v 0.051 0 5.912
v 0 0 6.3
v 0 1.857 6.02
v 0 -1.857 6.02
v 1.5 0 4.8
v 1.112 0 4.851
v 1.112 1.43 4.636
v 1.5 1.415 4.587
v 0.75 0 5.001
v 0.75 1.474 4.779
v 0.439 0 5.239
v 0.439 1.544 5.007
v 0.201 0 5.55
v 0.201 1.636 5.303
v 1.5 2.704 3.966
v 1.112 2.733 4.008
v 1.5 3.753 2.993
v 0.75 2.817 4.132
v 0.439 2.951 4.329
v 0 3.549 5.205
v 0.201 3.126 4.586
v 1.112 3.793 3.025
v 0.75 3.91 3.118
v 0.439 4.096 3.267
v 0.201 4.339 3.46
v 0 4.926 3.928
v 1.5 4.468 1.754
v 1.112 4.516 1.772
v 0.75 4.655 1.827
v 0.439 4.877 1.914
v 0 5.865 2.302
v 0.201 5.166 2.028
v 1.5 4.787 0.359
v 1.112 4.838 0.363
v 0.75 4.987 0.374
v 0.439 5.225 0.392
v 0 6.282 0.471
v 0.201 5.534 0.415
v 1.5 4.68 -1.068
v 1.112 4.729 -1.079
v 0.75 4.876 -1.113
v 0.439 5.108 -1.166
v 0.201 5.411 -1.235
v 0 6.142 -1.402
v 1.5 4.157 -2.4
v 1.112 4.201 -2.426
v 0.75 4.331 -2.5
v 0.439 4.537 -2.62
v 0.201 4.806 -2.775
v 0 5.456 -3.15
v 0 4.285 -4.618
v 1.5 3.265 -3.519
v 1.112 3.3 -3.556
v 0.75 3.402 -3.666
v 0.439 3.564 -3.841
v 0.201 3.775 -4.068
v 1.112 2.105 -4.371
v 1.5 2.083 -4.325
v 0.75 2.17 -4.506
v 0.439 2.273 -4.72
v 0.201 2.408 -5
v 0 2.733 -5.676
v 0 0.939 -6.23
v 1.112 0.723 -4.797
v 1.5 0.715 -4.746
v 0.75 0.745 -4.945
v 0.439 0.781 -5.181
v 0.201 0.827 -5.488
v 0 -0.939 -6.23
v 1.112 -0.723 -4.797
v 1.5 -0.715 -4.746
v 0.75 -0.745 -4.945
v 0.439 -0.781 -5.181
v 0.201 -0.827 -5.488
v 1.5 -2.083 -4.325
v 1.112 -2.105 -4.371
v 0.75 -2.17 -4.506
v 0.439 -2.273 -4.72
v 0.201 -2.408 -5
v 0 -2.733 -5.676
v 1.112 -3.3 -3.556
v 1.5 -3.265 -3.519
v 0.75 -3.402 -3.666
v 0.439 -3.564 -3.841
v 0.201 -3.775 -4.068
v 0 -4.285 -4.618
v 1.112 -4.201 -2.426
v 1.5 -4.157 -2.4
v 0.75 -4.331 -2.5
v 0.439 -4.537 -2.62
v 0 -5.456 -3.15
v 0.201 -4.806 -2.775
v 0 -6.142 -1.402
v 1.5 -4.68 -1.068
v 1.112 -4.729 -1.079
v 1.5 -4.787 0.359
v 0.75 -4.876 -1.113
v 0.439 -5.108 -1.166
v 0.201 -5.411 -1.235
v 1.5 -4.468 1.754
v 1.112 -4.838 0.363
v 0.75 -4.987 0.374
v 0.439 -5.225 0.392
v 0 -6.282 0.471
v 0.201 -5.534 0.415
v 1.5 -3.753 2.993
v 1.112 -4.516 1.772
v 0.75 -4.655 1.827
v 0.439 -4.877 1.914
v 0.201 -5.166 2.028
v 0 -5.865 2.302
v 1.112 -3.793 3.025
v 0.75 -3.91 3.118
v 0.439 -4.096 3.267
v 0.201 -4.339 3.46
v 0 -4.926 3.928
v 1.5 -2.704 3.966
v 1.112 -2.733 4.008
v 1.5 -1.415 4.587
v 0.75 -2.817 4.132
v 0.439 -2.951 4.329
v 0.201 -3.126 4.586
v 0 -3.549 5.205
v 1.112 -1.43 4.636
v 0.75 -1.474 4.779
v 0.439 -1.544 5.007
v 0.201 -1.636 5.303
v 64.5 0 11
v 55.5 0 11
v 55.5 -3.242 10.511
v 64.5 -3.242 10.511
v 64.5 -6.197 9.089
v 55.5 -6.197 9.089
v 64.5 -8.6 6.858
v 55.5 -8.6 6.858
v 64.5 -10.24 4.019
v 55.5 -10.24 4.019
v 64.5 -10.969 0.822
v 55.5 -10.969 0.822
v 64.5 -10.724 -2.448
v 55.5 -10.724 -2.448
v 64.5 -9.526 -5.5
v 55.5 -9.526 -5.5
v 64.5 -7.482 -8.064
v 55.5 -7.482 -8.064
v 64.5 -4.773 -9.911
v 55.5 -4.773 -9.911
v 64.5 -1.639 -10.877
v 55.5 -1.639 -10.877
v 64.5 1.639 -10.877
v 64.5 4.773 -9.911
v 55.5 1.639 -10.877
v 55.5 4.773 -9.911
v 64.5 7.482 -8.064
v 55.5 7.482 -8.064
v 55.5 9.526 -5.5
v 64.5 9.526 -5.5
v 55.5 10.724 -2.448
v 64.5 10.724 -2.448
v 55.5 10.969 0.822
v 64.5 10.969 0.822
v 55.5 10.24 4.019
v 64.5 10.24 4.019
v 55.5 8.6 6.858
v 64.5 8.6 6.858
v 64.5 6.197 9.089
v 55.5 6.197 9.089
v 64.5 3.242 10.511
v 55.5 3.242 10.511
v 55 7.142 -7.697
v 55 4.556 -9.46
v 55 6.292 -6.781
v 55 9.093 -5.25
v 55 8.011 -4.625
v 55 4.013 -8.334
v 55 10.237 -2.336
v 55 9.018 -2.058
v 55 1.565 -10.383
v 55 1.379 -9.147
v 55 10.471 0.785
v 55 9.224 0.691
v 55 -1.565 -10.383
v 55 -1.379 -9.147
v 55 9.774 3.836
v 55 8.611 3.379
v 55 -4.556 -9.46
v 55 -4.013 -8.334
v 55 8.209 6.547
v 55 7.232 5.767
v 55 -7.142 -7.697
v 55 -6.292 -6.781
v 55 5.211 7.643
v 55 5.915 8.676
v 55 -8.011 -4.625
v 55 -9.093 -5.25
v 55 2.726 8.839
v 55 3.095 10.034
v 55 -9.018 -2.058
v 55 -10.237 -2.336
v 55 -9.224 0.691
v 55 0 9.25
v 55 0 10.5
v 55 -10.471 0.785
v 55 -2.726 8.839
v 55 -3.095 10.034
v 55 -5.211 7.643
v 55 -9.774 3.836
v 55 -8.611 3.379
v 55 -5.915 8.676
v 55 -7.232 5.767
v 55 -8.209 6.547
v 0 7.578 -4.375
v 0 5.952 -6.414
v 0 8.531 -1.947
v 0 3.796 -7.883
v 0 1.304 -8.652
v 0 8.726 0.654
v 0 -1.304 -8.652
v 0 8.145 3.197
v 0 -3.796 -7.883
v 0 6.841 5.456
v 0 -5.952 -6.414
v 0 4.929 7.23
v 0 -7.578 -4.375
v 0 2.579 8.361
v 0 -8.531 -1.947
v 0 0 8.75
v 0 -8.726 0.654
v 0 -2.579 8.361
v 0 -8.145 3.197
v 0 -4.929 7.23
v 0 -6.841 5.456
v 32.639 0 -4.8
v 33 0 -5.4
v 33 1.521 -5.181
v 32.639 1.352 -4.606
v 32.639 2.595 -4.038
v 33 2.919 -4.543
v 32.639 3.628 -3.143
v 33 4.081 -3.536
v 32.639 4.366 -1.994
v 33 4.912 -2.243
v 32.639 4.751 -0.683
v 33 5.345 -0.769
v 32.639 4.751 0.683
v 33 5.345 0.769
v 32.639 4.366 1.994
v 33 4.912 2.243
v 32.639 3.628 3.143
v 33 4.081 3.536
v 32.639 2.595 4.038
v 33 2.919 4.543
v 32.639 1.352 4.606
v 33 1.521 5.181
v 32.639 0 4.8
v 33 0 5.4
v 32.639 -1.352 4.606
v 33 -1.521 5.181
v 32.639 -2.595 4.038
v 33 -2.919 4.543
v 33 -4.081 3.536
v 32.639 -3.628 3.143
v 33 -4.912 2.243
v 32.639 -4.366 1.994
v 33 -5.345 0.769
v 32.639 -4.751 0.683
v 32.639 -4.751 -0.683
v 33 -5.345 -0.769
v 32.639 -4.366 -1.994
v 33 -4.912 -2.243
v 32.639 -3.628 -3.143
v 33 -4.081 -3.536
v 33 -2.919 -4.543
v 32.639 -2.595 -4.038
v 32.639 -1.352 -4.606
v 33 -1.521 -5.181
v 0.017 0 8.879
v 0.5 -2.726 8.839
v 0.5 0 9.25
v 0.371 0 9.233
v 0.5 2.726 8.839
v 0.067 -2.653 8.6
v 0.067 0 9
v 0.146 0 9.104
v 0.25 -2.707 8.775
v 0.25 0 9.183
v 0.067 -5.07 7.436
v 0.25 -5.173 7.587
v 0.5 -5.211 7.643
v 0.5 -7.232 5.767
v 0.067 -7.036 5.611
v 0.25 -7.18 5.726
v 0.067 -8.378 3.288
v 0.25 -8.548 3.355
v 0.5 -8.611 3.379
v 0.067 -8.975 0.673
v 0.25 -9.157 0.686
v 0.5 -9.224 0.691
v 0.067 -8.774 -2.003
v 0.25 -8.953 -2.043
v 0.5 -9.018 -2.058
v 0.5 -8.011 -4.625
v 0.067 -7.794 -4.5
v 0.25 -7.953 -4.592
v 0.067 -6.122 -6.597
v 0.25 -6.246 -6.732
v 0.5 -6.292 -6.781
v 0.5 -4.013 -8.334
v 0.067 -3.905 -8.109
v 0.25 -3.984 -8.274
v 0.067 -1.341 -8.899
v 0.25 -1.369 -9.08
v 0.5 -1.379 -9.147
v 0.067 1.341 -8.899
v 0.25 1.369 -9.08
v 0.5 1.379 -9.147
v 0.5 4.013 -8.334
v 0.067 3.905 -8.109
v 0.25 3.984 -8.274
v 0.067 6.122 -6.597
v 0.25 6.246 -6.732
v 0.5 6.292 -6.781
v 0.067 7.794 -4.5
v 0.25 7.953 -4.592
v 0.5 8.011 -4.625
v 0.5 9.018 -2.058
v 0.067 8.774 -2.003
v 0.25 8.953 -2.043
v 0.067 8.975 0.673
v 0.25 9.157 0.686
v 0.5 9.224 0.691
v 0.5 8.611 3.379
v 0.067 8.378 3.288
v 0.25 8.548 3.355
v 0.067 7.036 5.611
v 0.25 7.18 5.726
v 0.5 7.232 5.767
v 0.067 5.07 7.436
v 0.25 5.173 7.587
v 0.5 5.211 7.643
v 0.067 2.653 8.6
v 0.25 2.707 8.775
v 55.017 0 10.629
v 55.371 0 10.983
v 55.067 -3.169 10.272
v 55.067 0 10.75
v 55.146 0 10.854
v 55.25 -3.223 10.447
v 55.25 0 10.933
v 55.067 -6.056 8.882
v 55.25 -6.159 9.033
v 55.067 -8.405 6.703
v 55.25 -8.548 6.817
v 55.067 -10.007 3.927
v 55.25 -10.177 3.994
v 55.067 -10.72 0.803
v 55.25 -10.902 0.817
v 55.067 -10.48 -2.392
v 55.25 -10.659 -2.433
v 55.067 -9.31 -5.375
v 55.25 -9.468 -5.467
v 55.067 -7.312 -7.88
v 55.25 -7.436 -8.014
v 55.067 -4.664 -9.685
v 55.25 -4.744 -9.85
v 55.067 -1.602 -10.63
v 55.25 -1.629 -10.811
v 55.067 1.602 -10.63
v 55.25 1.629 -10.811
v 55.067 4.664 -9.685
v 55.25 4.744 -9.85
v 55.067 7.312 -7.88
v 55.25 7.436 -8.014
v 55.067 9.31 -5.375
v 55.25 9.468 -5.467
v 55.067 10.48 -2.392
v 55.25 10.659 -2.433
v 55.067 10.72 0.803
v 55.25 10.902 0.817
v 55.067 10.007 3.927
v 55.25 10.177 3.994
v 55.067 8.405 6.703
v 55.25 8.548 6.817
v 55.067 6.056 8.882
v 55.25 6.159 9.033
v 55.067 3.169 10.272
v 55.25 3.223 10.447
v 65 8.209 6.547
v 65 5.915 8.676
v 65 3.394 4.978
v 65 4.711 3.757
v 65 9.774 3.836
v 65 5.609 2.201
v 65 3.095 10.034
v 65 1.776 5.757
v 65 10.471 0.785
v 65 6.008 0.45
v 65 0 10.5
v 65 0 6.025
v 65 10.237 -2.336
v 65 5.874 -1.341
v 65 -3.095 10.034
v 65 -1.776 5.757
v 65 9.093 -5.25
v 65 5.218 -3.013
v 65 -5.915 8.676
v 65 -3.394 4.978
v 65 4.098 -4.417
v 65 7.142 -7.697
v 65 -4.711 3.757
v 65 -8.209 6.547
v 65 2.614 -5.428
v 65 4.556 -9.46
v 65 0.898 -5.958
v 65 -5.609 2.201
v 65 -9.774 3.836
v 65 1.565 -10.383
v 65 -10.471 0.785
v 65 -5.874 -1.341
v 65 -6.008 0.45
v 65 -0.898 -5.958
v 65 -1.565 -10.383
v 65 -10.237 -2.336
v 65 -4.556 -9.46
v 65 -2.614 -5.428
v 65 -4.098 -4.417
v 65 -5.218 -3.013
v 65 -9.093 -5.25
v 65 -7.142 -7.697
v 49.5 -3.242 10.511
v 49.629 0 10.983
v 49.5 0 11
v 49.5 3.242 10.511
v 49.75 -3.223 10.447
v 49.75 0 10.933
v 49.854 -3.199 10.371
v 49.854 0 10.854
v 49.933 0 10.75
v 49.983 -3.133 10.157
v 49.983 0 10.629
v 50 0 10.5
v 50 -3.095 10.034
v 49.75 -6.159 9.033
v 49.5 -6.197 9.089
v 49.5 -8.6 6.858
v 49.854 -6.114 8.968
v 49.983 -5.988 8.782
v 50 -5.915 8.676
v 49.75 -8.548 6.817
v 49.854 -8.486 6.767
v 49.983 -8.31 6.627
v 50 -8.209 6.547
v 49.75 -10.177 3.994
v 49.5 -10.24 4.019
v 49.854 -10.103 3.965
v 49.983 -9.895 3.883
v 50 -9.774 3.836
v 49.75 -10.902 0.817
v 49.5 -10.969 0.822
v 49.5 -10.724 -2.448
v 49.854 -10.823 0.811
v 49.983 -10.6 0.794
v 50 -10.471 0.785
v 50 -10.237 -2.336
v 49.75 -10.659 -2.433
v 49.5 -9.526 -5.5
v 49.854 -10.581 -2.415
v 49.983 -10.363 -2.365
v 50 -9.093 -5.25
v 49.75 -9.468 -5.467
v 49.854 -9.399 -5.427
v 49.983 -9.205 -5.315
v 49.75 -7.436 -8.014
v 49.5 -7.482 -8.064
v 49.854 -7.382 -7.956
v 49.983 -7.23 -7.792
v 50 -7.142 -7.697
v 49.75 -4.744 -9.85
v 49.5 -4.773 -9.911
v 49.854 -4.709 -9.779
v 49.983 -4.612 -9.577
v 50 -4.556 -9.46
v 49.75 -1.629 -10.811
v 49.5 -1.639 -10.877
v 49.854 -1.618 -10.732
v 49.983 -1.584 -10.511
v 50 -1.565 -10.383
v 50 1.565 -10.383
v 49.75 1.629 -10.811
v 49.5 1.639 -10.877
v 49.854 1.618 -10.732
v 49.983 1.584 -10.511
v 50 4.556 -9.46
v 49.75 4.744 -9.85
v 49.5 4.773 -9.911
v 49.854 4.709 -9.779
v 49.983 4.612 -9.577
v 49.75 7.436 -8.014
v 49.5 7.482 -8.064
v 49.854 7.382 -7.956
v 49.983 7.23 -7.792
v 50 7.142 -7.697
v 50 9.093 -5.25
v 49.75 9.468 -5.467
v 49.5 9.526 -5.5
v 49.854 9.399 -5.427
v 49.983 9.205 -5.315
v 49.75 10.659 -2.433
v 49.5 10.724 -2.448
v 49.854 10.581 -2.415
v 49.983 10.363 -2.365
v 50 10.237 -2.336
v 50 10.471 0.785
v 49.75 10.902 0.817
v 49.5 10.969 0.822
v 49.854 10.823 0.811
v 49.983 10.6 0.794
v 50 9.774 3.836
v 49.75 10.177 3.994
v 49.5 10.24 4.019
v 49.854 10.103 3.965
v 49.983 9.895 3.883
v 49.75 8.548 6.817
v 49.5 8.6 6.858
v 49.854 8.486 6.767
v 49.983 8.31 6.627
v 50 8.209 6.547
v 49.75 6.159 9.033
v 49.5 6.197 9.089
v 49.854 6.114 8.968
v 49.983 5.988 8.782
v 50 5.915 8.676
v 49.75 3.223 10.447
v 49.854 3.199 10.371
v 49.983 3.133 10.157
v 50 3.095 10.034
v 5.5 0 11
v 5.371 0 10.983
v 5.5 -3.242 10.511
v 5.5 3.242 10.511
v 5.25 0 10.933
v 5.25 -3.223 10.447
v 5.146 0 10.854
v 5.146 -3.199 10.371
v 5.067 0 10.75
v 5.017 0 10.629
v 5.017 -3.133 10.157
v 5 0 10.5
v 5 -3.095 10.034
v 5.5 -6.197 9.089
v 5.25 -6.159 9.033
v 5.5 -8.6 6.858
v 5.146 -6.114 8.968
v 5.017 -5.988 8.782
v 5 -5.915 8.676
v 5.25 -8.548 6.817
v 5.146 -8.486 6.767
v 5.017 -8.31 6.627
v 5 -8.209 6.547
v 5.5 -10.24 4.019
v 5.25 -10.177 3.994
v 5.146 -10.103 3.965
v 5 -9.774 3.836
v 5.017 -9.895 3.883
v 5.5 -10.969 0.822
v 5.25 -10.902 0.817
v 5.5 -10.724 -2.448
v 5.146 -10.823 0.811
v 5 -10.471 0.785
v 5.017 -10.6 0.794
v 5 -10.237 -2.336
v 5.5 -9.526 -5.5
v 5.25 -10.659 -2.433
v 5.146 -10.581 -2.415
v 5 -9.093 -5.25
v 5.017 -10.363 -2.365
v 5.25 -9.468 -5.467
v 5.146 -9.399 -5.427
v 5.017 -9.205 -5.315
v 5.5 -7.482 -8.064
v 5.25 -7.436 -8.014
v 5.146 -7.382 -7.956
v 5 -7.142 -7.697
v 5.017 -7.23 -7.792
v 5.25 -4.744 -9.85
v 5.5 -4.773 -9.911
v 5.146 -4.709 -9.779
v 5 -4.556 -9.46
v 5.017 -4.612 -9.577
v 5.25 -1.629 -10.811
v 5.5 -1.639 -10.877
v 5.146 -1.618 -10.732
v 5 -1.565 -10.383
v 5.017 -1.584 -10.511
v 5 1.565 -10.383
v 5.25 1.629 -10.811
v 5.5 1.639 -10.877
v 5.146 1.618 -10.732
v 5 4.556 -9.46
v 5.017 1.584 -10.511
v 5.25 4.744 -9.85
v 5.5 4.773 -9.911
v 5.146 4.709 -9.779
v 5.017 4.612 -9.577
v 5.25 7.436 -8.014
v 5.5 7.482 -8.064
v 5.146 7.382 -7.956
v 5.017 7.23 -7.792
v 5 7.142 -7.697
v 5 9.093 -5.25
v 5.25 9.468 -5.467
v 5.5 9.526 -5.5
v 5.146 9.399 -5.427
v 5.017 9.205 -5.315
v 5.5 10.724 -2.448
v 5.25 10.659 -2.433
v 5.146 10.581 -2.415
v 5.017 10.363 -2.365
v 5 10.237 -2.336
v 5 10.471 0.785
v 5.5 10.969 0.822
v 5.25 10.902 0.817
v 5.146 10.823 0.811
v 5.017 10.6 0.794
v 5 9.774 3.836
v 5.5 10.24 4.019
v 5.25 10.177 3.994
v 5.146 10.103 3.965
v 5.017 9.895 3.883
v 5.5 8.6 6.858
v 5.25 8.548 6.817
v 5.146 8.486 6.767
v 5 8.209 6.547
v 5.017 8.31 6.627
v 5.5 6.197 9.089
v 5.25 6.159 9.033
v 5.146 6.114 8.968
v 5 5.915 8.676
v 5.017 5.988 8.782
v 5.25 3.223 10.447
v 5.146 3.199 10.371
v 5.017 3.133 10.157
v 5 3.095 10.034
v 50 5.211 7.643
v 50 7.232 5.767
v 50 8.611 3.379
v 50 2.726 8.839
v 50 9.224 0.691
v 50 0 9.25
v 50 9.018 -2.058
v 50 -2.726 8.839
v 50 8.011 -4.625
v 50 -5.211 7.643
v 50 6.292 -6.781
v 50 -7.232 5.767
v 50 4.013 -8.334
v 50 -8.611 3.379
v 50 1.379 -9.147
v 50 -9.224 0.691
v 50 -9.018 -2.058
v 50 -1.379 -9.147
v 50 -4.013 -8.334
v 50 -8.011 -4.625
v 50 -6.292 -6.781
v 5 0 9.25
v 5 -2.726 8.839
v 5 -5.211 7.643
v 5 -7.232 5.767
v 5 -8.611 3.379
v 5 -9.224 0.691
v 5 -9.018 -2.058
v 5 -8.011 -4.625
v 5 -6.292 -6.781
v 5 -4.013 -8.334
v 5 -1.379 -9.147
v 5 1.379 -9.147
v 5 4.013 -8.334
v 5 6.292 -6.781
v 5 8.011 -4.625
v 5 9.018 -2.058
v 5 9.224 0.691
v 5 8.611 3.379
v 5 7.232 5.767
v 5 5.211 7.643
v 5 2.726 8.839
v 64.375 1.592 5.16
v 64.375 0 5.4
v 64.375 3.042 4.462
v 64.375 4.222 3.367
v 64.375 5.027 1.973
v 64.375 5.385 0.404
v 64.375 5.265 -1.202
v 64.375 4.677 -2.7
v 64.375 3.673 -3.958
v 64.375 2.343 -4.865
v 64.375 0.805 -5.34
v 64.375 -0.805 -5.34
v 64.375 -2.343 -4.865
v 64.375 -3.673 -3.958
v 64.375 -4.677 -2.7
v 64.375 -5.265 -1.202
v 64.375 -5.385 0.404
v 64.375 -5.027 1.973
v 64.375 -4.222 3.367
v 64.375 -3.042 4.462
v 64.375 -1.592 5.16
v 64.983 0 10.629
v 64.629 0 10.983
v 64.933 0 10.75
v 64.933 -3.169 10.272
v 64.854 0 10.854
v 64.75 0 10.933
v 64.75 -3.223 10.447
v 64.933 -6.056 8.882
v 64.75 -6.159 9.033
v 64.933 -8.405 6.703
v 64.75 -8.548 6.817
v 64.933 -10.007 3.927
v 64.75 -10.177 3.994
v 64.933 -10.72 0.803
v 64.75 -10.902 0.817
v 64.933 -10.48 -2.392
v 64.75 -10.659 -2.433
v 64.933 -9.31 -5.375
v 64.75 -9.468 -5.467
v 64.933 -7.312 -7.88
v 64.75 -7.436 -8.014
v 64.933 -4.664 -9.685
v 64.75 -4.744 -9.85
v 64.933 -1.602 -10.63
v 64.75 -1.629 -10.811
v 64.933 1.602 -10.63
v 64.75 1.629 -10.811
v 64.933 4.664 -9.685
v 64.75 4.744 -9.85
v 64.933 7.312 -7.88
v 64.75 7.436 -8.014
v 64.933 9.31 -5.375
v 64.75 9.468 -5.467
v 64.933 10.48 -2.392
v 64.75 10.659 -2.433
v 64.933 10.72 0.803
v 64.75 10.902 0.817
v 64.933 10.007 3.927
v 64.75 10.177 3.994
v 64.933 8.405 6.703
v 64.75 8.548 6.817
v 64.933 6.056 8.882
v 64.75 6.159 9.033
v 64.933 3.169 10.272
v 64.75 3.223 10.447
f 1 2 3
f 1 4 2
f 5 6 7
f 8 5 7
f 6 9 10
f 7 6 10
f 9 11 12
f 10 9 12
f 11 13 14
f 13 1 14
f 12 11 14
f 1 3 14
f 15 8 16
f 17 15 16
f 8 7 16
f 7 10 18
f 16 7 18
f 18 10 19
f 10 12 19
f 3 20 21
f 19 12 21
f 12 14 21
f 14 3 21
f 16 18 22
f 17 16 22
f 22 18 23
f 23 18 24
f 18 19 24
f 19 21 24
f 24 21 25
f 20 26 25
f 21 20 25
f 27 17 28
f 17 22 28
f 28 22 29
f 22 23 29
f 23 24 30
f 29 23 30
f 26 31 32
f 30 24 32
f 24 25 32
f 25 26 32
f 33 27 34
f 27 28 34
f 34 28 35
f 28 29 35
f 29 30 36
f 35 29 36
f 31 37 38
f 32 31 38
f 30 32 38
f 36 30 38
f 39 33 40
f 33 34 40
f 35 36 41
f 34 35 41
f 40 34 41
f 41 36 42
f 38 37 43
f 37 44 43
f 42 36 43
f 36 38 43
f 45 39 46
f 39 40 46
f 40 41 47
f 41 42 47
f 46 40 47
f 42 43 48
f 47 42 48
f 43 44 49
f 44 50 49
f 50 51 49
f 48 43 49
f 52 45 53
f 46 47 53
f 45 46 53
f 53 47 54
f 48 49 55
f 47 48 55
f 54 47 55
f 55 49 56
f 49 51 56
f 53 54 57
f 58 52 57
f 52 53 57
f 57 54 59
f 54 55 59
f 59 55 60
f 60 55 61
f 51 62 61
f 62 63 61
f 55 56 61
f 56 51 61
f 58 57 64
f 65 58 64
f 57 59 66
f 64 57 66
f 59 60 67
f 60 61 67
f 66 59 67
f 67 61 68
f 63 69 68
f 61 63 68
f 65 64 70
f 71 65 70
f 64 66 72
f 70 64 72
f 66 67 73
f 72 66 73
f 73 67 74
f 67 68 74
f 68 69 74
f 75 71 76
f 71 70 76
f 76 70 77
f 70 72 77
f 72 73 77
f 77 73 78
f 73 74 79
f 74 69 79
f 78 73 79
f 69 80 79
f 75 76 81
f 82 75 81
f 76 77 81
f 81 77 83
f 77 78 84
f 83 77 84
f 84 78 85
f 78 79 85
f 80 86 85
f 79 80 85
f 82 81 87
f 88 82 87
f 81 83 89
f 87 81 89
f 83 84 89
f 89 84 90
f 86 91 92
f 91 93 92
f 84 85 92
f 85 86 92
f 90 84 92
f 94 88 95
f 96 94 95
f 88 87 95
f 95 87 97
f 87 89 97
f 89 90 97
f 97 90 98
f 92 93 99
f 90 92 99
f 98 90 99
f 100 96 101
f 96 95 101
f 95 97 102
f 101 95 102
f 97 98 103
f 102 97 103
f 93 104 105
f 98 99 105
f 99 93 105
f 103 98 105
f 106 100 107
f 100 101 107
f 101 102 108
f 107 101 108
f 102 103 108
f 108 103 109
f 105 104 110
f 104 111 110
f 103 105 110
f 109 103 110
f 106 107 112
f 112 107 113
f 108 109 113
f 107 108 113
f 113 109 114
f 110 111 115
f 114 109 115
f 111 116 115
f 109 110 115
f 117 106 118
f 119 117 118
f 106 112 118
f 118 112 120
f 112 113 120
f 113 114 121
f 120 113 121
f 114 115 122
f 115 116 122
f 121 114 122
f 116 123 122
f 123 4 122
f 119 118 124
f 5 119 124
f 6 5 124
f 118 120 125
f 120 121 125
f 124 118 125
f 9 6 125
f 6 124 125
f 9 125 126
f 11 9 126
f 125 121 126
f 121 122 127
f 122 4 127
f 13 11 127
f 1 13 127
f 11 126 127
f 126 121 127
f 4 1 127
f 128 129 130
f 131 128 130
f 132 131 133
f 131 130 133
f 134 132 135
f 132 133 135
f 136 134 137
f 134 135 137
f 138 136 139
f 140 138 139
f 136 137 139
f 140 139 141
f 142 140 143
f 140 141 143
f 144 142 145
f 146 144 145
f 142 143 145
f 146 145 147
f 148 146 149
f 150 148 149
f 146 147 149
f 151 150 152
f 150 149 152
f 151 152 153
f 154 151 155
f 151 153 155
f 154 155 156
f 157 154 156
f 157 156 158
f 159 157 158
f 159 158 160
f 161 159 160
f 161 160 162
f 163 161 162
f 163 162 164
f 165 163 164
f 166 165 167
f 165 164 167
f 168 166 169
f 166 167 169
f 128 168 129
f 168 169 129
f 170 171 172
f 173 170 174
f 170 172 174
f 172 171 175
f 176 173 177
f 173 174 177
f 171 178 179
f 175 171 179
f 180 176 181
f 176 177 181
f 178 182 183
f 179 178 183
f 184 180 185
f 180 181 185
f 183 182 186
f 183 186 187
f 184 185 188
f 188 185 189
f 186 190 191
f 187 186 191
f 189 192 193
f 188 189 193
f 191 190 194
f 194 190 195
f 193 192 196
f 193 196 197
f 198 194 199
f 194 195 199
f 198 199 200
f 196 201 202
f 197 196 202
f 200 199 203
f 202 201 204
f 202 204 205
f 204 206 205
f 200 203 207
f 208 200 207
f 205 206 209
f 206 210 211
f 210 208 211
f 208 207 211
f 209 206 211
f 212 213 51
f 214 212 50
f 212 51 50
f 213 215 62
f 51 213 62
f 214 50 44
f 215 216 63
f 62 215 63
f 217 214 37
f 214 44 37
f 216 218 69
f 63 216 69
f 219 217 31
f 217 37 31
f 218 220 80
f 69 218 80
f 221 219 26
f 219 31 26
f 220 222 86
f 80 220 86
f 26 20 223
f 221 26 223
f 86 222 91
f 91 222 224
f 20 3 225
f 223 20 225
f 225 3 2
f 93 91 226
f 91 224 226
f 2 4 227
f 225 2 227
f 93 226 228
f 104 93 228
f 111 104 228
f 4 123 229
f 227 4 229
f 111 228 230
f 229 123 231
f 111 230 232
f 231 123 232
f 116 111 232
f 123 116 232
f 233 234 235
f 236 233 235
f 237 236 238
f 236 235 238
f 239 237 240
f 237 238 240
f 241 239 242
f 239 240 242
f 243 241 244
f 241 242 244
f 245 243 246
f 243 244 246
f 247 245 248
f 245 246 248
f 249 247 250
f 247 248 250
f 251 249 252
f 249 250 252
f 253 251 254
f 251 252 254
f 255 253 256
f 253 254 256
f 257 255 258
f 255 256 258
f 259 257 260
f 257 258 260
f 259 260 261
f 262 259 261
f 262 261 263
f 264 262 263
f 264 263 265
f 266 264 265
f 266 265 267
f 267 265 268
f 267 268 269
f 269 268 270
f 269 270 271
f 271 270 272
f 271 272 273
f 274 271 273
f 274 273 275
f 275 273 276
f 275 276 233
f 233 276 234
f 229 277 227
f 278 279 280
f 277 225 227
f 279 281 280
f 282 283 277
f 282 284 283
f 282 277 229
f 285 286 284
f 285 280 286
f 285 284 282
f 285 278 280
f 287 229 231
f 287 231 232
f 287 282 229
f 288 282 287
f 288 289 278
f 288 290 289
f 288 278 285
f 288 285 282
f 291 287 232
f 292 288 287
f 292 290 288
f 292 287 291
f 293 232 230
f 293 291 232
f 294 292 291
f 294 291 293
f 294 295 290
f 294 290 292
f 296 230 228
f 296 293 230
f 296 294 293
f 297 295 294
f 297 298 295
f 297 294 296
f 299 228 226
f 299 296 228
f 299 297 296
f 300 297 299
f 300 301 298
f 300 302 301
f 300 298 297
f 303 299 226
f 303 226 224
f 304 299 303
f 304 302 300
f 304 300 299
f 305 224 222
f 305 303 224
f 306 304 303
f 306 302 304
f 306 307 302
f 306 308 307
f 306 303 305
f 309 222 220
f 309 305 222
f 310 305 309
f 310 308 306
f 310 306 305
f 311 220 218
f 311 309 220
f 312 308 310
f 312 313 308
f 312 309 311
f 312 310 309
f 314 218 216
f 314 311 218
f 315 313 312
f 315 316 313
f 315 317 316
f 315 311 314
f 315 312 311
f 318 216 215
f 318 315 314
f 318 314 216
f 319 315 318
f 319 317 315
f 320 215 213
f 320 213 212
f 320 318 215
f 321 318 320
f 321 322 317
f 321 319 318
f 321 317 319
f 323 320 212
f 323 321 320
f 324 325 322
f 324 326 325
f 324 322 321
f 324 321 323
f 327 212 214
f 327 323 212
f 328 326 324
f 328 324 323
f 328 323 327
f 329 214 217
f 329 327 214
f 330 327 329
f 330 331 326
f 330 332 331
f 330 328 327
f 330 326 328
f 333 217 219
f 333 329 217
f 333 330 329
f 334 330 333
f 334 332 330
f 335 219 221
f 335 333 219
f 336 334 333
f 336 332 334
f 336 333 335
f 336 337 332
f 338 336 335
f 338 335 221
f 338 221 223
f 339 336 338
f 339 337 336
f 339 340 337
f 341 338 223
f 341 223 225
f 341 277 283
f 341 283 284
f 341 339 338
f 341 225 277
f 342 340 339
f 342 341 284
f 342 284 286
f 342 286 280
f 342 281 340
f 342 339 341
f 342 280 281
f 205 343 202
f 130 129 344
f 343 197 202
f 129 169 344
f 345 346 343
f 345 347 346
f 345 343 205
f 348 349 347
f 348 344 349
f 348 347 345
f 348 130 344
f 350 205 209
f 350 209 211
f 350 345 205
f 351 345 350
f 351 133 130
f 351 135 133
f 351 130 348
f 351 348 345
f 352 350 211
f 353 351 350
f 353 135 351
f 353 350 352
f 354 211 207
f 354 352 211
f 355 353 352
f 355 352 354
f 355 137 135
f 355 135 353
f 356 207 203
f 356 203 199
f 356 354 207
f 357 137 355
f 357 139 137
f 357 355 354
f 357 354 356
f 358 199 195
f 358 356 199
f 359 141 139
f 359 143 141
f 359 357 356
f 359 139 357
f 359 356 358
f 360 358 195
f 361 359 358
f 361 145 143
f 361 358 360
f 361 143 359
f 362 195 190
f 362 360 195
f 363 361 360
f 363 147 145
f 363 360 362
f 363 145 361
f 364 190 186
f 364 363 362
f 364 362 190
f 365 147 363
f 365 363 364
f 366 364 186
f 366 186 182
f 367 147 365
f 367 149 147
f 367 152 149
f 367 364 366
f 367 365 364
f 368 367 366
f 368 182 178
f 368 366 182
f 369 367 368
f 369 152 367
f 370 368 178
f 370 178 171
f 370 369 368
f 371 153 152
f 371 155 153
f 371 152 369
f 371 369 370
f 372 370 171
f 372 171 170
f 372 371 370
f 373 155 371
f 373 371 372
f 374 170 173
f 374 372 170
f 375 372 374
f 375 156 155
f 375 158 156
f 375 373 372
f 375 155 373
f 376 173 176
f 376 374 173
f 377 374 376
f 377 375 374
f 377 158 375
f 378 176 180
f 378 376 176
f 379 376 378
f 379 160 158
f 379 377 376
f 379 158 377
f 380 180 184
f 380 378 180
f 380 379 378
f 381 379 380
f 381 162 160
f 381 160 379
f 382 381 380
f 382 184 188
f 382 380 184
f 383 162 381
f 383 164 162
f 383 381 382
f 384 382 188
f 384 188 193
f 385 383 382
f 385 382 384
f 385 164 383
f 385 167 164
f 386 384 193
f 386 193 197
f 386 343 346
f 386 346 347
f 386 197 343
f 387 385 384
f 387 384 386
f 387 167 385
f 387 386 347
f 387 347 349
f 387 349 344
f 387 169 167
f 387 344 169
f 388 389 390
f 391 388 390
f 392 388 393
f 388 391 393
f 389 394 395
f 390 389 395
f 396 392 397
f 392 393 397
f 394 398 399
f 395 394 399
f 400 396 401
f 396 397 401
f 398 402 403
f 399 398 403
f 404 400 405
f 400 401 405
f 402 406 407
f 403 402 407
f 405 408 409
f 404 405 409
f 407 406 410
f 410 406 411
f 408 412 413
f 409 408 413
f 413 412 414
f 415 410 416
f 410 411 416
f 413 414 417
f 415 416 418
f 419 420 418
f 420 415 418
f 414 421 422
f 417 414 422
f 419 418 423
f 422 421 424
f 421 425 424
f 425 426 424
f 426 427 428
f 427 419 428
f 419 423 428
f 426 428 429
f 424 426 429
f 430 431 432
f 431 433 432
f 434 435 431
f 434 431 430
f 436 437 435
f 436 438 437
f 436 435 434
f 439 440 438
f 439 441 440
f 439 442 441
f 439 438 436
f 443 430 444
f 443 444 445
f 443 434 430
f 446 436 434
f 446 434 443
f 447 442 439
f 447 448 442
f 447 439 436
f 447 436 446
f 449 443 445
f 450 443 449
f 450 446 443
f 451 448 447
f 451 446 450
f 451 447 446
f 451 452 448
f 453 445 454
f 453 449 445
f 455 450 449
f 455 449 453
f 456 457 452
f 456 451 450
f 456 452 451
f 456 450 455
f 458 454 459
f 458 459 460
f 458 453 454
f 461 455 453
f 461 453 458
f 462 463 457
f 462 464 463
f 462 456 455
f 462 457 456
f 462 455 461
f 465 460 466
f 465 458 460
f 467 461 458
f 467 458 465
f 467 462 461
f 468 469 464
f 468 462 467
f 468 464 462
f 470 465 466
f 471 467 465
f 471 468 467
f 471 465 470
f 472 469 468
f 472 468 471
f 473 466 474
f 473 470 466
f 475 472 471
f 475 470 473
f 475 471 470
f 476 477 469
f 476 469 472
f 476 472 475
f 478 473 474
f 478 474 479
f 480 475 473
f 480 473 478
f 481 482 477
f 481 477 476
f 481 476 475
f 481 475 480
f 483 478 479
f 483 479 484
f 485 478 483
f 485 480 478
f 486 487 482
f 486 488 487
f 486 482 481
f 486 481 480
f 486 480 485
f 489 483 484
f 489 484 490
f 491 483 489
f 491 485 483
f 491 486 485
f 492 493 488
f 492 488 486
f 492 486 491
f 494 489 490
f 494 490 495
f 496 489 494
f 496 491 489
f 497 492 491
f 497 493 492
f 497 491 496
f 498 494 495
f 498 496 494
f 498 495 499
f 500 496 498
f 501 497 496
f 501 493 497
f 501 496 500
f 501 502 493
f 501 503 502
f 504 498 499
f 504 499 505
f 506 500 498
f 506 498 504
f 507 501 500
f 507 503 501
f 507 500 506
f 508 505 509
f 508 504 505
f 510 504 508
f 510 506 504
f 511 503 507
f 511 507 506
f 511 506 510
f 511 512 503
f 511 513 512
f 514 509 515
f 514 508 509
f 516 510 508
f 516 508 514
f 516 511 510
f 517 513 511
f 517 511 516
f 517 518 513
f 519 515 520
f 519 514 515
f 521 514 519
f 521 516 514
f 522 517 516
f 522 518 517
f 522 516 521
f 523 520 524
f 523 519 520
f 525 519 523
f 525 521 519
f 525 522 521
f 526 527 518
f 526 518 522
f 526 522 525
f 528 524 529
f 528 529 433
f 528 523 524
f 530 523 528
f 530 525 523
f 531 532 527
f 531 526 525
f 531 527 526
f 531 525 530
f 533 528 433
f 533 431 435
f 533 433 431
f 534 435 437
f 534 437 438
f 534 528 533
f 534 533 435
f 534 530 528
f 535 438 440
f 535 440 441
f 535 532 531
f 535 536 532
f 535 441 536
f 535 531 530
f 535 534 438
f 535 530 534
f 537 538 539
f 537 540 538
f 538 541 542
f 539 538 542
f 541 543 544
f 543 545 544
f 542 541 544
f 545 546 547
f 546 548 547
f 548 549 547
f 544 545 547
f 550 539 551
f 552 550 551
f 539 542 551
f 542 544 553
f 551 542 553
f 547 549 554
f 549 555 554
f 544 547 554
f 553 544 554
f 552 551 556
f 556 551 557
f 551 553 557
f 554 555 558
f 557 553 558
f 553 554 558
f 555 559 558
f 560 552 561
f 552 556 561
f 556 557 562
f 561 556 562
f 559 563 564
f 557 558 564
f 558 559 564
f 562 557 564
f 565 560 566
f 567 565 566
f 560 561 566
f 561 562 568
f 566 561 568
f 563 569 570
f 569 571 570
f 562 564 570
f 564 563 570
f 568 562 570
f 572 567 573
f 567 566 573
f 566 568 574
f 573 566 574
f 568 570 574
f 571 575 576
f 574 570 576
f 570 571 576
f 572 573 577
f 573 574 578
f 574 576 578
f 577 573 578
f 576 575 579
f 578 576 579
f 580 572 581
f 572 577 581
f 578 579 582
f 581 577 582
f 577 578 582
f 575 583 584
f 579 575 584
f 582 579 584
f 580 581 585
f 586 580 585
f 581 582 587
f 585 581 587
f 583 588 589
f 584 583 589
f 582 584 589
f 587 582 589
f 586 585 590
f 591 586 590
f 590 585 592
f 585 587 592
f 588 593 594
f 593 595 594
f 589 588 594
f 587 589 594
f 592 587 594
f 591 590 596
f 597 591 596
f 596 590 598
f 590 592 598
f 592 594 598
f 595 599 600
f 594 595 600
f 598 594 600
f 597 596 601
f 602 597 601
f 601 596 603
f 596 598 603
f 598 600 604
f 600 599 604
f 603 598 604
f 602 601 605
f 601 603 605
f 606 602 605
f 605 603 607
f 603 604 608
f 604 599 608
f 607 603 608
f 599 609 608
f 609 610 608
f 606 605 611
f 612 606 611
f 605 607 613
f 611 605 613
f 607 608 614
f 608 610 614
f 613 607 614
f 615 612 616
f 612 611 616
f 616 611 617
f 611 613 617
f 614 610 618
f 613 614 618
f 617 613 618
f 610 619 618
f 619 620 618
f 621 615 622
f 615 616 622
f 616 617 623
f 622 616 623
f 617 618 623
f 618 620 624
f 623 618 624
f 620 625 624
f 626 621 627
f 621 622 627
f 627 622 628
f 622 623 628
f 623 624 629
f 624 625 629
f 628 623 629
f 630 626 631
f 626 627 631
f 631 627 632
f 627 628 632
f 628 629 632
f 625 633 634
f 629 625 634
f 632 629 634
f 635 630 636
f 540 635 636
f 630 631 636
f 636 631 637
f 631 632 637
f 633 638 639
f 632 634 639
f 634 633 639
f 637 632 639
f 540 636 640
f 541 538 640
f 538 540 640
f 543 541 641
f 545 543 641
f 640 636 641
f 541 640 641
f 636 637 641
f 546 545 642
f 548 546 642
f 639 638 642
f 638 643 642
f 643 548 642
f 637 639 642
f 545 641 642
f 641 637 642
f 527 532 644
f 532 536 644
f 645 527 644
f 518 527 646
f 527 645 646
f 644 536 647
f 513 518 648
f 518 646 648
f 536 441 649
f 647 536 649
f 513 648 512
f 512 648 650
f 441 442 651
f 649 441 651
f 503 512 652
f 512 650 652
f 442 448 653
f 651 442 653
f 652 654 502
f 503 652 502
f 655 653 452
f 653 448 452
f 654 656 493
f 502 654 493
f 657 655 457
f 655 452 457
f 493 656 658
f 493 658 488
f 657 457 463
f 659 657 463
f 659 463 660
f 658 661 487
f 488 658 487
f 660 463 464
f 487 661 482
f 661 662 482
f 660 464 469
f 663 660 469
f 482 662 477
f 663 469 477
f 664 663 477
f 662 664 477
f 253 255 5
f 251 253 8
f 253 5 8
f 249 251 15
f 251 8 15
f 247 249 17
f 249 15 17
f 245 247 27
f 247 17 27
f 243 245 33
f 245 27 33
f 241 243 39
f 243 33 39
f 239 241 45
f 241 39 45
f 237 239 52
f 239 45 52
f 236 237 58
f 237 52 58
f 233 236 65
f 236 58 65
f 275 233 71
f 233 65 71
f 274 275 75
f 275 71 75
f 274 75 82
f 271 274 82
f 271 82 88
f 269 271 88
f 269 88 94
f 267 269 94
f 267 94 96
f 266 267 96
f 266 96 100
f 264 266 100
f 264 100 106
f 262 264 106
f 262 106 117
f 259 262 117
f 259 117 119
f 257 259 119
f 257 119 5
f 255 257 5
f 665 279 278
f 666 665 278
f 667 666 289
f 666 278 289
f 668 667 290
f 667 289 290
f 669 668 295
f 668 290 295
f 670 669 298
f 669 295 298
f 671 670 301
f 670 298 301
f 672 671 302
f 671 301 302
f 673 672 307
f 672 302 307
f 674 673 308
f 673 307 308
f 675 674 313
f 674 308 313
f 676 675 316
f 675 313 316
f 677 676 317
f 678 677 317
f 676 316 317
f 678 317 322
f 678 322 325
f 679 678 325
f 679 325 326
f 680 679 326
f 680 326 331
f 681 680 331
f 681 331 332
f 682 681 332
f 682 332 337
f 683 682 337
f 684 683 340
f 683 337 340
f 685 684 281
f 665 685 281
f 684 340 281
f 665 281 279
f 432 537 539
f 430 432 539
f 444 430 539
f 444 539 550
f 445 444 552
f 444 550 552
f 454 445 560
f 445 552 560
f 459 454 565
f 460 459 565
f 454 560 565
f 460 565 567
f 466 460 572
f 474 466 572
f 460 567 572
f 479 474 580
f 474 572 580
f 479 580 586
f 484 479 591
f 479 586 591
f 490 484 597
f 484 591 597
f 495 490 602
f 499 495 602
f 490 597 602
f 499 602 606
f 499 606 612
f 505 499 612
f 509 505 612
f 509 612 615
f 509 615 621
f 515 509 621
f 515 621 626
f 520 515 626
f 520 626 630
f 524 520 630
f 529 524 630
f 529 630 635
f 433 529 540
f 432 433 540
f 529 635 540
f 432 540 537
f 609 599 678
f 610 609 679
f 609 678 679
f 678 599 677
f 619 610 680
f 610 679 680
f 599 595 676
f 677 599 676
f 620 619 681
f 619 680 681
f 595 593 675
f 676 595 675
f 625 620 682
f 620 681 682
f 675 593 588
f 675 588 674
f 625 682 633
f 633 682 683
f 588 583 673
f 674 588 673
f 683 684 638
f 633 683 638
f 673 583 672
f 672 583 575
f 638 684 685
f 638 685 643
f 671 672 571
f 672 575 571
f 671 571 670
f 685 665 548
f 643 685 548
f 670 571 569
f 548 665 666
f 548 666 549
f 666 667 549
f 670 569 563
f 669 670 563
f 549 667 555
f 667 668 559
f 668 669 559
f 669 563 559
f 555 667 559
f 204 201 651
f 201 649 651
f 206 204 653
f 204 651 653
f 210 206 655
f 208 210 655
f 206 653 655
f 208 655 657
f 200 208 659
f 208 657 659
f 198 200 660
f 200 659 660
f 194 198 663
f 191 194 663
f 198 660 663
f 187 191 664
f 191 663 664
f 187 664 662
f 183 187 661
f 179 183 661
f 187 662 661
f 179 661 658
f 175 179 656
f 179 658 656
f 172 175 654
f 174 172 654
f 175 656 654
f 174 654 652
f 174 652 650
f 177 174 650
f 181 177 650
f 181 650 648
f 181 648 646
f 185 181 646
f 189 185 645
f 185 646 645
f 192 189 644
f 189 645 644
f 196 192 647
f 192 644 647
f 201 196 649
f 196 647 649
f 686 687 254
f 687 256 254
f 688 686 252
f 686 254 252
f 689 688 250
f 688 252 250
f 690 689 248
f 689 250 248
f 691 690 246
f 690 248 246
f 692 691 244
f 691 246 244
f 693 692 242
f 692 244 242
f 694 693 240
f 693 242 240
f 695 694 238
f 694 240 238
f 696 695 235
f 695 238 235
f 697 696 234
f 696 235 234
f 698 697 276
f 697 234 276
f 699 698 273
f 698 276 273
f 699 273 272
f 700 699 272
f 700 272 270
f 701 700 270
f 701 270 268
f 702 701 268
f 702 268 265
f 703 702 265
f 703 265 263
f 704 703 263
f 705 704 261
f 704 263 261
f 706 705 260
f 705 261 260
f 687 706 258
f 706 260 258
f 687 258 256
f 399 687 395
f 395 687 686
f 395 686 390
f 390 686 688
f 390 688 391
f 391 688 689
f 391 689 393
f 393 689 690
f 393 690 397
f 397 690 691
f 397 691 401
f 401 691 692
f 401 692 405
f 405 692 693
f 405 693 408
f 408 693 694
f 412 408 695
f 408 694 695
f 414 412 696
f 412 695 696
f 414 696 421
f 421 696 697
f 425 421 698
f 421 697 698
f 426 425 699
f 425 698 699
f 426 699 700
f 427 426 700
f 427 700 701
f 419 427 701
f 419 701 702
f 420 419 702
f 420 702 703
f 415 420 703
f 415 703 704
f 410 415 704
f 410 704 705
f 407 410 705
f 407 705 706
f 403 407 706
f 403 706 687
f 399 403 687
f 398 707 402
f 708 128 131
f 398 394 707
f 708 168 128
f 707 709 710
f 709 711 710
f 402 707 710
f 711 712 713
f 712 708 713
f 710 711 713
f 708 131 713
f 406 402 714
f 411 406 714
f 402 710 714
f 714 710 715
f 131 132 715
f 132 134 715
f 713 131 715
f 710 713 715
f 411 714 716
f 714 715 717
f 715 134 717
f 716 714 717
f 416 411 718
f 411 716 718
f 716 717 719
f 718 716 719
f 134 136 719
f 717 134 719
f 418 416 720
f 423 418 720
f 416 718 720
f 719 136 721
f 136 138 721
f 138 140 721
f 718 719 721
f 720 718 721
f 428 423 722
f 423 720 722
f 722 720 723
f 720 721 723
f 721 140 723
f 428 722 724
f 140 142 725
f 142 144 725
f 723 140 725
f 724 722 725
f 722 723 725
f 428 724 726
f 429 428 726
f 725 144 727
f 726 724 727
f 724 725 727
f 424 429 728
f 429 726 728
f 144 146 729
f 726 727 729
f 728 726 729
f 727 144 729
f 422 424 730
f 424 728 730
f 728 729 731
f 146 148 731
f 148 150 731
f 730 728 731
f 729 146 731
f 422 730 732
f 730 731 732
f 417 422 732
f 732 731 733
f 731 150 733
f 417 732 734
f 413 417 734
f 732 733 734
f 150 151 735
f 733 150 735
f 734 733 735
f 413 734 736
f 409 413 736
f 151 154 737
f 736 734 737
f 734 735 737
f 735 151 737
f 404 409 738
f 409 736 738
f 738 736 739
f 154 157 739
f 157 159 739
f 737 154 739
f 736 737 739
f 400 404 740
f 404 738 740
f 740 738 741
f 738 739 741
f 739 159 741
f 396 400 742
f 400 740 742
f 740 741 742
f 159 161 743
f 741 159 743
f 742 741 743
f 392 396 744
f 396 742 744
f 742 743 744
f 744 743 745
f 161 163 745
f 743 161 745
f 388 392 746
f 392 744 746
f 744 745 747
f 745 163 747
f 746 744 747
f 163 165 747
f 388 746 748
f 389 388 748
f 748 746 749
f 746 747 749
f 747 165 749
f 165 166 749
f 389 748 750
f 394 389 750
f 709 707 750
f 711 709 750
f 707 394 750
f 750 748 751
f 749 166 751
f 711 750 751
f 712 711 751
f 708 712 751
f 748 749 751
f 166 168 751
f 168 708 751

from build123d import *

# Parameters (mm, degrees)
ESBO_O2_R                             = 4.8
CORTE_EXTRUS_O1_DEPTH                 = 33
FURO_ROSCADO_DE_M12X1_251_D           = 10.8
FURO_ROSCADO_DE_M12X1_251_DEPTH       = 32
FURO_ROSCADO_DE_M12X1_251_CSINK_D     = 12.05
FURO_ROSCADO_DE_M12X1_251_CSINK_ANGLE = 90
FURO_ROSCADO_DE_M12X1_251_TIP         = 3.244647343
FILETE1_R                             = 1.5
FILETE2_R                             = 0.5
FILETE3_R                             = 0.5
FILETE4_R                             = 0.5


with BuildPart() as part:
    # Esboço1 → Revolução1 (revolve)
    with BuildSketch(Plane.XY, mode=Mode.PRIVATE) as revolu_o1_sk:
        Polygon((0, 0), (65, 0), (65, 11), (55, 11), (55, 9.25), (50, 9.25), (50, 11), (5, 11), (5, 9.25), (0, 9.25), align=None)
    revolve(revolu_o1_sk.sketch.rotate(Axis((0, 0, 0), (1, 0, 0)), 90), axis=Axis((0, 0, 0), (1, 0, 0)))

    # Esboço2 → Corte-extrusão1 (cut)
    with BuildSketch(Plane.ZY):
        Circle(ESBO_O2_R)
    extrude(amount=-CORTE_EXTRUS_O1_DEPTH, mode=Mode.SUBTRACT)

    # Furo roscado de M12x1.251
    with Locations(Plane(origin=(65, 0, 0), x_dir=(0, 0, -1), z_dir=(1, 0, 0))):
        with Locations((0, 0)):
            CounterSinkHole(FURO_ROSCADO_DE_M12X1_251_D / 2, FURO_ROSCADO_DE_M12X1_251_CSINK_D / 2, depth=FURO_ROSCADO_DE_M12X1_251_DEPTH, counter_sink_angle=FURO_ROSCADO_DE_M12X1_251_CSINK_ANGLE)
            with Locations((0, 0, -(FURO_ROSCADO_DE_M12X1_251_DEPTH + FURO_ROSCADO_DE_M12X1_251_TIP / 2))):  # 118° drill point
                Cone(0, FURO_ROSCADO_DE_M12X1_251_D / 2, FURO_ROSCADO_DE_M12X1_251_TIP, mode=Mode.SUBTRACT)

    # Filete1
    filete1_edges = [part.edges().sort_by_distance(p)[0] for p in [
        (0, 0, -4.8),
    ]]
    fillet(filete1_edges, radius=FILETE1_R)

    # Filete2
    filete2_edges = [part.edges().sort_by_distance(p)[0] for p in [
        (0, 0, -9.25),
    ]]
    fillet(filete2_edges, radius=FILETE2_R)

    # Filete3
    filete3_edges = [part.edges().sort_by_distance(p)[0] for p in [
        (65, 0, -11),
        (50, 0, -11),
        (55, 0, -11),
    ]]
    fillet(filete3_edges, radius=FILETE3_R)

    # Filete4
    filete4_edges = [part.edges().sort_by_distance(p)[0] for p in [
        (5, 0, -11),
    ]]
    fillet(filete4_edges, radius=FILETE4_R)


solid = part.part
